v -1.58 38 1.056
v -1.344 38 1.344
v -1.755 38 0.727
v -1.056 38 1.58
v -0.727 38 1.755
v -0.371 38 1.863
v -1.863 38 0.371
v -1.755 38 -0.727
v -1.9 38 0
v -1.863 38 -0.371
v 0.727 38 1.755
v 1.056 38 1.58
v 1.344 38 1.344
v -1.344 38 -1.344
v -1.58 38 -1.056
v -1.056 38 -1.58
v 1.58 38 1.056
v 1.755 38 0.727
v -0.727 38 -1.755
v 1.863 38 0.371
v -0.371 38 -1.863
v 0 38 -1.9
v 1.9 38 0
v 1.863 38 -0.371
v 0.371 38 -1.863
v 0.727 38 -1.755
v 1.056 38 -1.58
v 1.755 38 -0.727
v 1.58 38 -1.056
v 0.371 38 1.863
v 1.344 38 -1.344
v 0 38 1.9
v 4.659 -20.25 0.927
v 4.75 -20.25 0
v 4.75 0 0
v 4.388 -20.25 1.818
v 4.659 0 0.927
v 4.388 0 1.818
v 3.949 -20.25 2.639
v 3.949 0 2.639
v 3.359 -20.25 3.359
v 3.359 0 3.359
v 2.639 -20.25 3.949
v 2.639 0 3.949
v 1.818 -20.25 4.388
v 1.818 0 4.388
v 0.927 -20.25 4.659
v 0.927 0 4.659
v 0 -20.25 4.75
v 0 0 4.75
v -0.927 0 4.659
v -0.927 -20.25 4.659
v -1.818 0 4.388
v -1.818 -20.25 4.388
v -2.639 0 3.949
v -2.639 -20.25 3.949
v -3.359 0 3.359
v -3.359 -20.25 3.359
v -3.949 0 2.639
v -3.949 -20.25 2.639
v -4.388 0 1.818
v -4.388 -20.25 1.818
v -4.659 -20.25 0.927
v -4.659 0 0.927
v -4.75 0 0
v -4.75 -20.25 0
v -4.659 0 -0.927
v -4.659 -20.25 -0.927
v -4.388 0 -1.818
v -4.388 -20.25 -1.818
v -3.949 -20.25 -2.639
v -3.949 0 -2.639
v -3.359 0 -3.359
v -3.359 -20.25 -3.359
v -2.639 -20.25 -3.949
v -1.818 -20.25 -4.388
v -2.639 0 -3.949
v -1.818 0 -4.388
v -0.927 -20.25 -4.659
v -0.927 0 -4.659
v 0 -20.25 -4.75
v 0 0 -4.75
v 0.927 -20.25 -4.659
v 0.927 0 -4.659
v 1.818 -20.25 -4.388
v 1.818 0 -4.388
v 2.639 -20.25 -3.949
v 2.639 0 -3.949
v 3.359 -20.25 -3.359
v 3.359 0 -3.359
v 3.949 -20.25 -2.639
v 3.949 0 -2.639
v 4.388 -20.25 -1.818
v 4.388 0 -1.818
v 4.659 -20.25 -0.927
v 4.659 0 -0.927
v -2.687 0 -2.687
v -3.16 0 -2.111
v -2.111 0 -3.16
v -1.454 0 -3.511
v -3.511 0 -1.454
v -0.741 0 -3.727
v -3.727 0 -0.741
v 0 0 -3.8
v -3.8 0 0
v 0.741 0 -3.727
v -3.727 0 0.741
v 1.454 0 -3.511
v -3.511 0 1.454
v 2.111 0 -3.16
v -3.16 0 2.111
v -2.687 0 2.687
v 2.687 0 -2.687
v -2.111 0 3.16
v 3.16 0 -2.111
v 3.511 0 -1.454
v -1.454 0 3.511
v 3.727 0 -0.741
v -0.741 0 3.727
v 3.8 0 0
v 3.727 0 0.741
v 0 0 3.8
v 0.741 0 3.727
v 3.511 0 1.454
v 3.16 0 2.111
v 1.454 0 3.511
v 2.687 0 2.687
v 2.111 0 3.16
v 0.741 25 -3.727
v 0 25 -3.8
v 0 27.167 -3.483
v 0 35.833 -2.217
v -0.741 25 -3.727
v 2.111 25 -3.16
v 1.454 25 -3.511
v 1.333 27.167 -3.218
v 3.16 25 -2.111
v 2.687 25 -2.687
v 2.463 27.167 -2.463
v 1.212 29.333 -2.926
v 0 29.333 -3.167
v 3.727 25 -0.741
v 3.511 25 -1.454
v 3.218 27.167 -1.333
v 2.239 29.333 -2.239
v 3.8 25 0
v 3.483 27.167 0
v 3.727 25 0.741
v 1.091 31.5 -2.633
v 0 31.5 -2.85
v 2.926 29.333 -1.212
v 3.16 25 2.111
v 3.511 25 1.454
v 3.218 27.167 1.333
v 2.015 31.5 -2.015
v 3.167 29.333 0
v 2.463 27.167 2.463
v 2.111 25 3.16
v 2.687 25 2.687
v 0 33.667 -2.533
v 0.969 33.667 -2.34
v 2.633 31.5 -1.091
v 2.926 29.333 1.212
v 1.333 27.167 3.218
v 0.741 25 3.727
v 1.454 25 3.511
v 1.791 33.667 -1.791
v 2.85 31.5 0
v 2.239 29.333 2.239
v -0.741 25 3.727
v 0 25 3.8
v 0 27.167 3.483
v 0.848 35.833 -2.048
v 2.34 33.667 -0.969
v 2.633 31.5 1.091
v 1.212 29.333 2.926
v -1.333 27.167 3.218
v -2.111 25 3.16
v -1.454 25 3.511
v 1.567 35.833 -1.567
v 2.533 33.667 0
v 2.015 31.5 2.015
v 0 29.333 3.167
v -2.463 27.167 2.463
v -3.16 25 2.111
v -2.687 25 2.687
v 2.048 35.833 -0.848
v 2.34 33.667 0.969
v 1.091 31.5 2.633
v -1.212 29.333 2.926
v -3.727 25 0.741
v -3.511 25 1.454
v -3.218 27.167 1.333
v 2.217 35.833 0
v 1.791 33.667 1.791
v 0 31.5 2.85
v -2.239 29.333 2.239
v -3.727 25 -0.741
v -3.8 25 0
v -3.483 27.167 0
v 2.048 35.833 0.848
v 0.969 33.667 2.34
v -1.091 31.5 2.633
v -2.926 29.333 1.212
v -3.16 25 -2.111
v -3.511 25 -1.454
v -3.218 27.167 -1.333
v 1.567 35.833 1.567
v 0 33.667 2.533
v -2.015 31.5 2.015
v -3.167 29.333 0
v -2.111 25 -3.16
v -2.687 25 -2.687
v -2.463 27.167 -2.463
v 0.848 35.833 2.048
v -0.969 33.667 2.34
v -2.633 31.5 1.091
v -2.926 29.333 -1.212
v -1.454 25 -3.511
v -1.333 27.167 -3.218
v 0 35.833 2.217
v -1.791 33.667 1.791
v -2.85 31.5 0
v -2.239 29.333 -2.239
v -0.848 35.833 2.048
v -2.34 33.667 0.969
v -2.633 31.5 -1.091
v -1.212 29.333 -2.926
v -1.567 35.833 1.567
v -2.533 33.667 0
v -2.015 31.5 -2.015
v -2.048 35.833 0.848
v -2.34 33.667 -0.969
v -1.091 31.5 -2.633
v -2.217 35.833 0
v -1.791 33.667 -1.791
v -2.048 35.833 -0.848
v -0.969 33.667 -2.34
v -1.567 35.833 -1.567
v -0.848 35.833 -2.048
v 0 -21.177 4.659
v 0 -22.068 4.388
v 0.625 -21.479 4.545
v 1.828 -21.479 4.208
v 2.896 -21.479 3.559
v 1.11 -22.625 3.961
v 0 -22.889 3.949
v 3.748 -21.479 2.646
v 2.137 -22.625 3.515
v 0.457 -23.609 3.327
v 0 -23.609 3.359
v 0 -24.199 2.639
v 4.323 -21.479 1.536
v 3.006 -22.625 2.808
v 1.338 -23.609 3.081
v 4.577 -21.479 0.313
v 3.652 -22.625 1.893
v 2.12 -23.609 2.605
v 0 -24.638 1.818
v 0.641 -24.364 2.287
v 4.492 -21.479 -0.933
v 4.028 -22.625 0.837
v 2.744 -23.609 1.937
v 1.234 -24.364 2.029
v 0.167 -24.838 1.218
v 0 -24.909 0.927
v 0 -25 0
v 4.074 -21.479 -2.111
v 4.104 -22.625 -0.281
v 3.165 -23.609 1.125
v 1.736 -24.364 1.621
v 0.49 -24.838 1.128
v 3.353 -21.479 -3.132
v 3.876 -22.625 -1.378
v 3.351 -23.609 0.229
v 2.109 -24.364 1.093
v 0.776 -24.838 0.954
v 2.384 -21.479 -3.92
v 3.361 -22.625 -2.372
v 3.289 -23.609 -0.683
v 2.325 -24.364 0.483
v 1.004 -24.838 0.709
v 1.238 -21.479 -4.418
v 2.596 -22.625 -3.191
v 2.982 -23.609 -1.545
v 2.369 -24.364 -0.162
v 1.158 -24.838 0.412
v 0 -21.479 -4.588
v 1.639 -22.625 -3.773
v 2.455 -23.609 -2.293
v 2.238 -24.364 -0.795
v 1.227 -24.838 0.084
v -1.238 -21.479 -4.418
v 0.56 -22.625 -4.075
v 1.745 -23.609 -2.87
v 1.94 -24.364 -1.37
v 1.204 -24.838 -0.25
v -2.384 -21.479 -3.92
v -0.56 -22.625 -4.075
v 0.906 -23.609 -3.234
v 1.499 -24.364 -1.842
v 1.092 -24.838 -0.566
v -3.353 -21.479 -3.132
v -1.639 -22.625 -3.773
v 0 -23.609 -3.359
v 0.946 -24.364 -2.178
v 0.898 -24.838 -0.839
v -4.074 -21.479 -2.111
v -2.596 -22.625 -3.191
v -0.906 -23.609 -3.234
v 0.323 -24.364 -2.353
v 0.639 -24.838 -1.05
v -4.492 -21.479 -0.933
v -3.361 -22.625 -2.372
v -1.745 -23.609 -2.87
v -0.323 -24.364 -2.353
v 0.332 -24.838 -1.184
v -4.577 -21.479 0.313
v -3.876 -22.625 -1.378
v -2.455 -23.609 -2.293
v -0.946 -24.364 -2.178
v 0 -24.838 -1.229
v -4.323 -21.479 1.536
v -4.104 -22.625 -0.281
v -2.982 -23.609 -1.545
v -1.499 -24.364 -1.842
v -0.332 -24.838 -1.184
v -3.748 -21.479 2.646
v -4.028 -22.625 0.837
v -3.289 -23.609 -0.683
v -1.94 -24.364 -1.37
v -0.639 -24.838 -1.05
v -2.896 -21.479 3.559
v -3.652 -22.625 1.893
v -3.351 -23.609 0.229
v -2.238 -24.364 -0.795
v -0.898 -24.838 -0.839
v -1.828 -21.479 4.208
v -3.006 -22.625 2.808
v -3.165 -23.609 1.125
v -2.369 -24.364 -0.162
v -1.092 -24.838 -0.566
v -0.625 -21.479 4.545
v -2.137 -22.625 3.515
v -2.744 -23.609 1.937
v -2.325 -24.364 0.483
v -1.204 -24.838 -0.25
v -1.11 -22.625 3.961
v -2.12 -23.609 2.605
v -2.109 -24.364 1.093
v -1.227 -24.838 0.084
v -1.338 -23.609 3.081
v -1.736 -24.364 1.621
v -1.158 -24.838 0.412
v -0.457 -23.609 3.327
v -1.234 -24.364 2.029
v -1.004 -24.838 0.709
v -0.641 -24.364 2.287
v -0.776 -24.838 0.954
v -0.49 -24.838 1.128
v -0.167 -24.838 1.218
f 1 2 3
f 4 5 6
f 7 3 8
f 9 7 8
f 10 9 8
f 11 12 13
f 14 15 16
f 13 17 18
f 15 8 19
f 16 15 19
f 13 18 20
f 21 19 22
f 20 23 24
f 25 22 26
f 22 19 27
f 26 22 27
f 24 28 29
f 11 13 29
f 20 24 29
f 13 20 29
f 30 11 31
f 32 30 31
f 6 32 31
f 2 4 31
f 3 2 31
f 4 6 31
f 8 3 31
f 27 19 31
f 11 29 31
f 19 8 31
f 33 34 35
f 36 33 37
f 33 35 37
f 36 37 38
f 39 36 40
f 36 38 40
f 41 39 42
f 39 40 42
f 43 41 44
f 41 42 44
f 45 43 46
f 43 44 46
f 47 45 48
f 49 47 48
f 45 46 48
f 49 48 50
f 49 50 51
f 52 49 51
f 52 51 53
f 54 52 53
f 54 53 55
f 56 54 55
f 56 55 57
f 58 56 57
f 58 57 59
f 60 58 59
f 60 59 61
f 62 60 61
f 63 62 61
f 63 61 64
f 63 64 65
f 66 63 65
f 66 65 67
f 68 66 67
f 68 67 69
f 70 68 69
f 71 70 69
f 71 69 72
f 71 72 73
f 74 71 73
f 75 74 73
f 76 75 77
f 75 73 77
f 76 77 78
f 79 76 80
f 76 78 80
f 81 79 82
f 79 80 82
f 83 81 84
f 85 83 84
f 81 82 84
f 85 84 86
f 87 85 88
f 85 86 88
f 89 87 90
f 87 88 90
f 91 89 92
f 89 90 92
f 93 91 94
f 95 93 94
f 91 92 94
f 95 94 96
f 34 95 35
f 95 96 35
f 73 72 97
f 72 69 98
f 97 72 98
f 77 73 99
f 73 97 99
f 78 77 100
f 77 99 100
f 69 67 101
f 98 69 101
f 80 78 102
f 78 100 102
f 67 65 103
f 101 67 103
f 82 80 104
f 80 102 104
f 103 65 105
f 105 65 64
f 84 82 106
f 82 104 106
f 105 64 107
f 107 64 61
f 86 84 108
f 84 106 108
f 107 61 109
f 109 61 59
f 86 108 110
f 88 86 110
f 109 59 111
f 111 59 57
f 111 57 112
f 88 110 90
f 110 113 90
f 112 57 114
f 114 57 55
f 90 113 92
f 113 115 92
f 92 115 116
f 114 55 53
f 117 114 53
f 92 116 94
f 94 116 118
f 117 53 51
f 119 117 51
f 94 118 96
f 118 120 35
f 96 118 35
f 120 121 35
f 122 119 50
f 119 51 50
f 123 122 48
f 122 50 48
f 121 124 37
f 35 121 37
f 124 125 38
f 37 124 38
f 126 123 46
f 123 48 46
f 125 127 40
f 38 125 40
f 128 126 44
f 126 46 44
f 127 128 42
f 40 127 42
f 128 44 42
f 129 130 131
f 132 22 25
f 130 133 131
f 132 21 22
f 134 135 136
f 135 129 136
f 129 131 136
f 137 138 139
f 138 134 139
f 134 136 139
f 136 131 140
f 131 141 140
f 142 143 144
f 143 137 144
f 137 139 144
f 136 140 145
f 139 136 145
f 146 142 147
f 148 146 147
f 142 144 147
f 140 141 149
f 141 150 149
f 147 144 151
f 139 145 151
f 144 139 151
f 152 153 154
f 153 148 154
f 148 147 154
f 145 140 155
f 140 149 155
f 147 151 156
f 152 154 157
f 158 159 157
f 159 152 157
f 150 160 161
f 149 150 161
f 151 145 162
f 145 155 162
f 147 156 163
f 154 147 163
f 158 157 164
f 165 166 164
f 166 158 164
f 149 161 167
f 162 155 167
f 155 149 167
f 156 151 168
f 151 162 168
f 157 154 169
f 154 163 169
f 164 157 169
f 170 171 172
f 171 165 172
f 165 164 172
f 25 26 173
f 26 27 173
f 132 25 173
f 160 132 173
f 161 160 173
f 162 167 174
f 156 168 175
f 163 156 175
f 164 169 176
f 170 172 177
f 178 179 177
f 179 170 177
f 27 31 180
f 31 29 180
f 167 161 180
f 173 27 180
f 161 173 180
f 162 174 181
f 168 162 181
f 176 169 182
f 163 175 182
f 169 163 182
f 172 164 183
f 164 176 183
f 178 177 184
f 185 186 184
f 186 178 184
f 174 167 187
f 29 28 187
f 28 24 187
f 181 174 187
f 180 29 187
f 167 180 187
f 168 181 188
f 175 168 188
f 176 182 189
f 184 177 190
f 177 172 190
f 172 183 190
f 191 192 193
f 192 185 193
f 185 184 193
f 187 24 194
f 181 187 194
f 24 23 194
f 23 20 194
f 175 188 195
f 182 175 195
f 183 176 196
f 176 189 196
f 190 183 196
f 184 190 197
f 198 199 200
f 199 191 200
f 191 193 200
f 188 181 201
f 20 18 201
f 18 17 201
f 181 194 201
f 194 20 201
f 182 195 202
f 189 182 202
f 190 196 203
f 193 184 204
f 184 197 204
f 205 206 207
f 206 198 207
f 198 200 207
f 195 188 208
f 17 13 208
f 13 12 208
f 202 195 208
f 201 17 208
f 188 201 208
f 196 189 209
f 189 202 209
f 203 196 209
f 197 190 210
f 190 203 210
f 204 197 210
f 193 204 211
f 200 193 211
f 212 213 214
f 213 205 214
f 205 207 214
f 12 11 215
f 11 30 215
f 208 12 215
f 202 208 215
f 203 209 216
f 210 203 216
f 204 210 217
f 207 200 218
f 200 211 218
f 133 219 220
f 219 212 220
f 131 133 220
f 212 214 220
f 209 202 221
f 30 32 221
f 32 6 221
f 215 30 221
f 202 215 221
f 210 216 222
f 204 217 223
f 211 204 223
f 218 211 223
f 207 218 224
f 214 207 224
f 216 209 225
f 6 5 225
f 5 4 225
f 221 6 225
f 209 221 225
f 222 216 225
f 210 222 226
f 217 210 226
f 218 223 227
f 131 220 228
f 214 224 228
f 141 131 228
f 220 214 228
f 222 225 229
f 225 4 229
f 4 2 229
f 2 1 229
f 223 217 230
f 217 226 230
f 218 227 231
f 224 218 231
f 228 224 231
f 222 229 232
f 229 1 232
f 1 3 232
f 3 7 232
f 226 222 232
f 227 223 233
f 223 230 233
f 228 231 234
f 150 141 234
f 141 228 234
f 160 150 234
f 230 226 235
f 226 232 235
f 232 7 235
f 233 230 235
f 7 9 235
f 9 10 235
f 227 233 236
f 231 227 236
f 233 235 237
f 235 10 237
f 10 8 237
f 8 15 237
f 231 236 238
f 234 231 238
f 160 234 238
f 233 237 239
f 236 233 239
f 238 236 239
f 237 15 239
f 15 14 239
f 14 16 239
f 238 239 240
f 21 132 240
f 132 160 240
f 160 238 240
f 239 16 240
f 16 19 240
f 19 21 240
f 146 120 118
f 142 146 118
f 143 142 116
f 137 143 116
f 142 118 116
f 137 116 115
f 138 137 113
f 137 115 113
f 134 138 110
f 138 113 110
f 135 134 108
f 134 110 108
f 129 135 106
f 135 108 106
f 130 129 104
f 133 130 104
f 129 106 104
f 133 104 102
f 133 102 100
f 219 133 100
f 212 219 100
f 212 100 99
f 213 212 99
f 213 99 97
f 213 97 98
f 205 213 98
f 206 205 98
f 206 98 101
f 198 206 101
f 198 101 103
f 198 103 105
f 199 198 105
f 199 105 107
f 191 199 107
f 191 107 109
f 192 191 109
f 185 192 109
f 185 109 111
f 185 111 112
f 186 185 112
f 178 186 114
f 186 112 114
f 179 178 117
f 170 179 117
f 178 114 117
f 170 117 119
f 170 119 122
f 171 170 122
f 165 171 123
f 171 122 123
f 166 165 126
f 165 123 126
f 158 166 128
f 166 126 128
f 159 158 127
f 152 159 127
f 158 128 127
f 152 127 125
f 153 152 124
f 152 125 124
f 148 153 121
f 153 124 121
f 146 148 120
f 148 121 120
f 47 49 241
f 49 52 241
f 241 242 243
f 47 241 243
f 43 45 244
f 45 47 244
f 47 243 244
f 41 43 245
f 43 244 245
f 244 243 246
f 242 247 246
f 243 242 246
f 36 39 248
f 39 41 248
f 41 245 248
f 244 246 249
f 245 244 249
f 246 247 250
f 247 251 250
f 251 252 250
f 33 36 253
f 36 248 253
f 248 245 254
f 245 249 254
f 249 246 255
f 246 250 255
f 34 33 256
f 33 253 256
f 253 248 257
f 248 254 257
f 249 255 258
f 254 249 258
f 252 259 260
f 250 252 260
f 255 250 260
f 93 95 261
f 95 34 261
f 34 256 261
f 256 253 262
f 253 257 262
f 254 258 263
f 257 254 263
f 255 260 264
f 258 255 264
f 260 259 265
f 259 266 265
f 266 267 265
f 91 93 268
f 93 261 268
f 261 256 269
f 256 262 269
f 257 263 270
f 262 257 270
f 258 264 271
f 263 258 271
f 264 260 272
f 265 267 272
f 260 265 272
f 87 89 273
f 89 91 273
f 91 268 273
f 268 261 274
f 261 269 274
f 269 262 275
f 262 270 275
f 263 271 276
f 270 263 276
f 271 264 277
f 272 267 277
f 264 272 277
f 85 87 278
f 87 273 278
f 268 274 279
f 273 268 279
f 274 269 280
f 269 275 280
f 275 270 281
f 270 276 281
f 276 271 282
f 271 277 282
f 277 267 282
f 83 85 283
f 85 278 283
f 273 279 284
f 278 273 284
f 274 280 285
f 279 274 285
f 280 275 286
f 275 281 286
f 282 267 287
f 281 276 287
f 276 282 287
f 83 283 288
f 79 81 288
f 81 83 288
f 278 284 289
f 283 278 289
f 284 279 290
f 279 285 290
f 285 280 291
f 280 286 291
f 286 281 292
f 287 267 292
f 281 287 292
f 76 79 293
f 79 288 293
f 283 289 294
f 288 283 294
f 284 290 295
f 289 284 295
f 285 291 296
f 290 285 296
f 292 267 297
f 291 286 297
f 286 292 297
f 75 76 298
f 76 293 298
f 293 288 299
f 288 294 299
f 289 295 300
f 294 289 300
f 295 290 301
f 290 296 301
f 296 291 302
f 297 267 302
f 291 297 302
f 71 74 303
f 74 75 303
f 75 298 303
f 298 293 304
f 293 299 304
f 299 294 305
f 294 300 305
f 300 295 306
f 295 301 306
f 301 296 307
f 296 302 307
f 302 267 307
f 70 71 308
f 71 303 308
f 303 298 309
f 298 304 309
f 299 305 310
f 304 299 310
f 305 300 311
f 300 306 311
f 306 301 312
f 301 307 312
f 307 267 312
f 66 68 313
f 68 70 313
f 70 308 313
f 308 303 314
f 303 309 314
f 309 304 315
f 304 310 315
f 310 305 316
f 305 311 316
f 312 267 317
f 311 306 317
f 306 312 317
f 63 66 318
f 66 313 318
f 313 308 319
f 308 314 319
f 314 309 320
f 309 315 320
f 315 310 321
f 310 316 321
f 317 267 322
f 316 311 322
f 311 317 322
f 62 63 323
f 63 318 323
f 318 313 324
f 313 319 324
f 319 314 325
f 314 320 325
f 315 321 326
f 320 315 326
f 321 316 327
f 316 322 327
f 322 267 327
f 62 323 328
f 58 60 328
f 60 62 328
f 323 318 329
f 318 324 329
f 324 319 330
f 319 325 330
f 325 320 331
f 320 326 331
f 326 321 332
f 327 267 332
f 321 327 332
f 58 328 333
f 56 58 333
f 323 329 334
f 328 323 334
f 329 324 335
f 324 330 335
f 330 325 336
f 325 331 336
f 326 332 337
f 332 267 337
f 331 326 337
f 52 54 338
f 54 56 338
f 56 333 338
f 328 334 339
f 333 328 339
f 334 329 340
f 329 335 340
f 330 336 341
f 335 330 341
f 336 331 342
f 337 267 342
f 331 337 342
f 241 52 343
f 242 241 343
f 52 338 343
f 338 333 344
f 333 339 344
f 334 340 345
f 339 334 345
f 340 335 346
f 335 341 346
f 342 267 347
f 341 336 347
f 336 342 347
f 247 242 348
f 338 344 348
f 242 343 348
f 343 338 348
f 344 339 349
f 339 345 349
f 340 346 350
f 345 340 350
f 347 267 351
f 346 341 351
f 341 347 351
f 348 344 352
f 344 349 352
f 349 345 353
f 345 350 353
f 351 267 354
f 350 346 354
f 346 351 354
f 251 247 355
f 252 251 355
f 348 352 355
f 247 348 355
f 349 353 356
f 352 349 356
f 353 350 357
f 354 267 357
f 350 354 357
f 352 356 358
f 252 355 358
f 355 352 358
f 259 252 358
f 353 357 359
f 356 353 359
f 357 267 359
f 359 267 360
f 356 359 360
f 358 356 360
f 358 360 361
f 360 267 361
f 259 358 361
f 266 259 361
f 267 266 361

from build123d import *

# Parameters (mm, degrees)
SKETCH1_R      = 3.8
EXTRUDE1_DEPTH = 25
SKETCH2_R      = 4.75
EXTRUDE2_DEPTH = 20.25


with BuildPart() as part:
    # Sketch1 → Extrude1 (new body)
    with BuildSketch(Plane(origin=(0, 0, 0), x_dir=(1, 0, 0), z_dir=(0, 1, 0))):
        Circle(SKETCH1_R)
    extrude(amount=EXTRUDE1_DEPTH)

    # Sketch2 → Extrude2 (add)
    with BuildSketch(Plane.XZ):
        Circle(SKETCH2_R)
    extrude(amount=EXTRUDE2_DEPTH)

    # Sketch3 → Revolve1 (revolve)
    with BuildSketch(Plane(origin=(0, 0, 0), x_dir=(0, 0, -1), z_dir=(1, 0, 0))):
        with BuildLine():
            Line((0, -25), (0, -20.25))
            Line((0, -20.25), (-4.75, -20.25))
            ThreePointArc((-4.75, -20.25), (-3.358757211, -23.608757211), (0, -25))
        make_face()
    revolve(axis=Axis((0, -25.519108832, 0), (0, 1, 0)))

    # Sketch4 → Revolve2 (revolve)
    with BuildSketch(Plane(origin=(0, 0, 0), x_dir=(0, 0, -1), z_dir=(1, 0, 0))):
        Polygon((0, 25), (3.8, 25), (1.9, 38), (0, 38), align=None)
    revolve(axis=Axis((0, 39.39190429, 0), (0, -1, 0)))


solid = part.part
